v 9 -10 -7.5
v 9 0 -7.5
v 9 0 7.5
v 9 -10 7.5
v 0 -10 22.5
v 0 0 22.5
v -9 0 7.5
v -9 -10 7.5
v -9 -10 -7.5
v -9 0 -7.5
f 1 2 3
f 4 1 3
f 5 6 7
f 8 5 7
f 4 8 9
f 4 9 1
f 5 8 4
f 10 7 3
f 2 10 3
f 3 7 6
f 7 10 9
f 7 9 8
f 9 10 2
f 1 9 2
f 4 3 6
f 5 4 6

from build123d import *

# Parameters (mm, degrees)
F0_W     = 18
F0_H     = 15
F1_DEPTH = 10


with BuildPart() as f1:
    # F0 (on Front) → F1 (new body)
    with BuildSketch(Plane.XZ):
        Rectangle(F0_W, F0_H)
        Polygon((-9, 7.5), (9, 7.5), (0, 22.5), align=None)
    extrude(amount=F1_DEPTH)


solid = f1.part
